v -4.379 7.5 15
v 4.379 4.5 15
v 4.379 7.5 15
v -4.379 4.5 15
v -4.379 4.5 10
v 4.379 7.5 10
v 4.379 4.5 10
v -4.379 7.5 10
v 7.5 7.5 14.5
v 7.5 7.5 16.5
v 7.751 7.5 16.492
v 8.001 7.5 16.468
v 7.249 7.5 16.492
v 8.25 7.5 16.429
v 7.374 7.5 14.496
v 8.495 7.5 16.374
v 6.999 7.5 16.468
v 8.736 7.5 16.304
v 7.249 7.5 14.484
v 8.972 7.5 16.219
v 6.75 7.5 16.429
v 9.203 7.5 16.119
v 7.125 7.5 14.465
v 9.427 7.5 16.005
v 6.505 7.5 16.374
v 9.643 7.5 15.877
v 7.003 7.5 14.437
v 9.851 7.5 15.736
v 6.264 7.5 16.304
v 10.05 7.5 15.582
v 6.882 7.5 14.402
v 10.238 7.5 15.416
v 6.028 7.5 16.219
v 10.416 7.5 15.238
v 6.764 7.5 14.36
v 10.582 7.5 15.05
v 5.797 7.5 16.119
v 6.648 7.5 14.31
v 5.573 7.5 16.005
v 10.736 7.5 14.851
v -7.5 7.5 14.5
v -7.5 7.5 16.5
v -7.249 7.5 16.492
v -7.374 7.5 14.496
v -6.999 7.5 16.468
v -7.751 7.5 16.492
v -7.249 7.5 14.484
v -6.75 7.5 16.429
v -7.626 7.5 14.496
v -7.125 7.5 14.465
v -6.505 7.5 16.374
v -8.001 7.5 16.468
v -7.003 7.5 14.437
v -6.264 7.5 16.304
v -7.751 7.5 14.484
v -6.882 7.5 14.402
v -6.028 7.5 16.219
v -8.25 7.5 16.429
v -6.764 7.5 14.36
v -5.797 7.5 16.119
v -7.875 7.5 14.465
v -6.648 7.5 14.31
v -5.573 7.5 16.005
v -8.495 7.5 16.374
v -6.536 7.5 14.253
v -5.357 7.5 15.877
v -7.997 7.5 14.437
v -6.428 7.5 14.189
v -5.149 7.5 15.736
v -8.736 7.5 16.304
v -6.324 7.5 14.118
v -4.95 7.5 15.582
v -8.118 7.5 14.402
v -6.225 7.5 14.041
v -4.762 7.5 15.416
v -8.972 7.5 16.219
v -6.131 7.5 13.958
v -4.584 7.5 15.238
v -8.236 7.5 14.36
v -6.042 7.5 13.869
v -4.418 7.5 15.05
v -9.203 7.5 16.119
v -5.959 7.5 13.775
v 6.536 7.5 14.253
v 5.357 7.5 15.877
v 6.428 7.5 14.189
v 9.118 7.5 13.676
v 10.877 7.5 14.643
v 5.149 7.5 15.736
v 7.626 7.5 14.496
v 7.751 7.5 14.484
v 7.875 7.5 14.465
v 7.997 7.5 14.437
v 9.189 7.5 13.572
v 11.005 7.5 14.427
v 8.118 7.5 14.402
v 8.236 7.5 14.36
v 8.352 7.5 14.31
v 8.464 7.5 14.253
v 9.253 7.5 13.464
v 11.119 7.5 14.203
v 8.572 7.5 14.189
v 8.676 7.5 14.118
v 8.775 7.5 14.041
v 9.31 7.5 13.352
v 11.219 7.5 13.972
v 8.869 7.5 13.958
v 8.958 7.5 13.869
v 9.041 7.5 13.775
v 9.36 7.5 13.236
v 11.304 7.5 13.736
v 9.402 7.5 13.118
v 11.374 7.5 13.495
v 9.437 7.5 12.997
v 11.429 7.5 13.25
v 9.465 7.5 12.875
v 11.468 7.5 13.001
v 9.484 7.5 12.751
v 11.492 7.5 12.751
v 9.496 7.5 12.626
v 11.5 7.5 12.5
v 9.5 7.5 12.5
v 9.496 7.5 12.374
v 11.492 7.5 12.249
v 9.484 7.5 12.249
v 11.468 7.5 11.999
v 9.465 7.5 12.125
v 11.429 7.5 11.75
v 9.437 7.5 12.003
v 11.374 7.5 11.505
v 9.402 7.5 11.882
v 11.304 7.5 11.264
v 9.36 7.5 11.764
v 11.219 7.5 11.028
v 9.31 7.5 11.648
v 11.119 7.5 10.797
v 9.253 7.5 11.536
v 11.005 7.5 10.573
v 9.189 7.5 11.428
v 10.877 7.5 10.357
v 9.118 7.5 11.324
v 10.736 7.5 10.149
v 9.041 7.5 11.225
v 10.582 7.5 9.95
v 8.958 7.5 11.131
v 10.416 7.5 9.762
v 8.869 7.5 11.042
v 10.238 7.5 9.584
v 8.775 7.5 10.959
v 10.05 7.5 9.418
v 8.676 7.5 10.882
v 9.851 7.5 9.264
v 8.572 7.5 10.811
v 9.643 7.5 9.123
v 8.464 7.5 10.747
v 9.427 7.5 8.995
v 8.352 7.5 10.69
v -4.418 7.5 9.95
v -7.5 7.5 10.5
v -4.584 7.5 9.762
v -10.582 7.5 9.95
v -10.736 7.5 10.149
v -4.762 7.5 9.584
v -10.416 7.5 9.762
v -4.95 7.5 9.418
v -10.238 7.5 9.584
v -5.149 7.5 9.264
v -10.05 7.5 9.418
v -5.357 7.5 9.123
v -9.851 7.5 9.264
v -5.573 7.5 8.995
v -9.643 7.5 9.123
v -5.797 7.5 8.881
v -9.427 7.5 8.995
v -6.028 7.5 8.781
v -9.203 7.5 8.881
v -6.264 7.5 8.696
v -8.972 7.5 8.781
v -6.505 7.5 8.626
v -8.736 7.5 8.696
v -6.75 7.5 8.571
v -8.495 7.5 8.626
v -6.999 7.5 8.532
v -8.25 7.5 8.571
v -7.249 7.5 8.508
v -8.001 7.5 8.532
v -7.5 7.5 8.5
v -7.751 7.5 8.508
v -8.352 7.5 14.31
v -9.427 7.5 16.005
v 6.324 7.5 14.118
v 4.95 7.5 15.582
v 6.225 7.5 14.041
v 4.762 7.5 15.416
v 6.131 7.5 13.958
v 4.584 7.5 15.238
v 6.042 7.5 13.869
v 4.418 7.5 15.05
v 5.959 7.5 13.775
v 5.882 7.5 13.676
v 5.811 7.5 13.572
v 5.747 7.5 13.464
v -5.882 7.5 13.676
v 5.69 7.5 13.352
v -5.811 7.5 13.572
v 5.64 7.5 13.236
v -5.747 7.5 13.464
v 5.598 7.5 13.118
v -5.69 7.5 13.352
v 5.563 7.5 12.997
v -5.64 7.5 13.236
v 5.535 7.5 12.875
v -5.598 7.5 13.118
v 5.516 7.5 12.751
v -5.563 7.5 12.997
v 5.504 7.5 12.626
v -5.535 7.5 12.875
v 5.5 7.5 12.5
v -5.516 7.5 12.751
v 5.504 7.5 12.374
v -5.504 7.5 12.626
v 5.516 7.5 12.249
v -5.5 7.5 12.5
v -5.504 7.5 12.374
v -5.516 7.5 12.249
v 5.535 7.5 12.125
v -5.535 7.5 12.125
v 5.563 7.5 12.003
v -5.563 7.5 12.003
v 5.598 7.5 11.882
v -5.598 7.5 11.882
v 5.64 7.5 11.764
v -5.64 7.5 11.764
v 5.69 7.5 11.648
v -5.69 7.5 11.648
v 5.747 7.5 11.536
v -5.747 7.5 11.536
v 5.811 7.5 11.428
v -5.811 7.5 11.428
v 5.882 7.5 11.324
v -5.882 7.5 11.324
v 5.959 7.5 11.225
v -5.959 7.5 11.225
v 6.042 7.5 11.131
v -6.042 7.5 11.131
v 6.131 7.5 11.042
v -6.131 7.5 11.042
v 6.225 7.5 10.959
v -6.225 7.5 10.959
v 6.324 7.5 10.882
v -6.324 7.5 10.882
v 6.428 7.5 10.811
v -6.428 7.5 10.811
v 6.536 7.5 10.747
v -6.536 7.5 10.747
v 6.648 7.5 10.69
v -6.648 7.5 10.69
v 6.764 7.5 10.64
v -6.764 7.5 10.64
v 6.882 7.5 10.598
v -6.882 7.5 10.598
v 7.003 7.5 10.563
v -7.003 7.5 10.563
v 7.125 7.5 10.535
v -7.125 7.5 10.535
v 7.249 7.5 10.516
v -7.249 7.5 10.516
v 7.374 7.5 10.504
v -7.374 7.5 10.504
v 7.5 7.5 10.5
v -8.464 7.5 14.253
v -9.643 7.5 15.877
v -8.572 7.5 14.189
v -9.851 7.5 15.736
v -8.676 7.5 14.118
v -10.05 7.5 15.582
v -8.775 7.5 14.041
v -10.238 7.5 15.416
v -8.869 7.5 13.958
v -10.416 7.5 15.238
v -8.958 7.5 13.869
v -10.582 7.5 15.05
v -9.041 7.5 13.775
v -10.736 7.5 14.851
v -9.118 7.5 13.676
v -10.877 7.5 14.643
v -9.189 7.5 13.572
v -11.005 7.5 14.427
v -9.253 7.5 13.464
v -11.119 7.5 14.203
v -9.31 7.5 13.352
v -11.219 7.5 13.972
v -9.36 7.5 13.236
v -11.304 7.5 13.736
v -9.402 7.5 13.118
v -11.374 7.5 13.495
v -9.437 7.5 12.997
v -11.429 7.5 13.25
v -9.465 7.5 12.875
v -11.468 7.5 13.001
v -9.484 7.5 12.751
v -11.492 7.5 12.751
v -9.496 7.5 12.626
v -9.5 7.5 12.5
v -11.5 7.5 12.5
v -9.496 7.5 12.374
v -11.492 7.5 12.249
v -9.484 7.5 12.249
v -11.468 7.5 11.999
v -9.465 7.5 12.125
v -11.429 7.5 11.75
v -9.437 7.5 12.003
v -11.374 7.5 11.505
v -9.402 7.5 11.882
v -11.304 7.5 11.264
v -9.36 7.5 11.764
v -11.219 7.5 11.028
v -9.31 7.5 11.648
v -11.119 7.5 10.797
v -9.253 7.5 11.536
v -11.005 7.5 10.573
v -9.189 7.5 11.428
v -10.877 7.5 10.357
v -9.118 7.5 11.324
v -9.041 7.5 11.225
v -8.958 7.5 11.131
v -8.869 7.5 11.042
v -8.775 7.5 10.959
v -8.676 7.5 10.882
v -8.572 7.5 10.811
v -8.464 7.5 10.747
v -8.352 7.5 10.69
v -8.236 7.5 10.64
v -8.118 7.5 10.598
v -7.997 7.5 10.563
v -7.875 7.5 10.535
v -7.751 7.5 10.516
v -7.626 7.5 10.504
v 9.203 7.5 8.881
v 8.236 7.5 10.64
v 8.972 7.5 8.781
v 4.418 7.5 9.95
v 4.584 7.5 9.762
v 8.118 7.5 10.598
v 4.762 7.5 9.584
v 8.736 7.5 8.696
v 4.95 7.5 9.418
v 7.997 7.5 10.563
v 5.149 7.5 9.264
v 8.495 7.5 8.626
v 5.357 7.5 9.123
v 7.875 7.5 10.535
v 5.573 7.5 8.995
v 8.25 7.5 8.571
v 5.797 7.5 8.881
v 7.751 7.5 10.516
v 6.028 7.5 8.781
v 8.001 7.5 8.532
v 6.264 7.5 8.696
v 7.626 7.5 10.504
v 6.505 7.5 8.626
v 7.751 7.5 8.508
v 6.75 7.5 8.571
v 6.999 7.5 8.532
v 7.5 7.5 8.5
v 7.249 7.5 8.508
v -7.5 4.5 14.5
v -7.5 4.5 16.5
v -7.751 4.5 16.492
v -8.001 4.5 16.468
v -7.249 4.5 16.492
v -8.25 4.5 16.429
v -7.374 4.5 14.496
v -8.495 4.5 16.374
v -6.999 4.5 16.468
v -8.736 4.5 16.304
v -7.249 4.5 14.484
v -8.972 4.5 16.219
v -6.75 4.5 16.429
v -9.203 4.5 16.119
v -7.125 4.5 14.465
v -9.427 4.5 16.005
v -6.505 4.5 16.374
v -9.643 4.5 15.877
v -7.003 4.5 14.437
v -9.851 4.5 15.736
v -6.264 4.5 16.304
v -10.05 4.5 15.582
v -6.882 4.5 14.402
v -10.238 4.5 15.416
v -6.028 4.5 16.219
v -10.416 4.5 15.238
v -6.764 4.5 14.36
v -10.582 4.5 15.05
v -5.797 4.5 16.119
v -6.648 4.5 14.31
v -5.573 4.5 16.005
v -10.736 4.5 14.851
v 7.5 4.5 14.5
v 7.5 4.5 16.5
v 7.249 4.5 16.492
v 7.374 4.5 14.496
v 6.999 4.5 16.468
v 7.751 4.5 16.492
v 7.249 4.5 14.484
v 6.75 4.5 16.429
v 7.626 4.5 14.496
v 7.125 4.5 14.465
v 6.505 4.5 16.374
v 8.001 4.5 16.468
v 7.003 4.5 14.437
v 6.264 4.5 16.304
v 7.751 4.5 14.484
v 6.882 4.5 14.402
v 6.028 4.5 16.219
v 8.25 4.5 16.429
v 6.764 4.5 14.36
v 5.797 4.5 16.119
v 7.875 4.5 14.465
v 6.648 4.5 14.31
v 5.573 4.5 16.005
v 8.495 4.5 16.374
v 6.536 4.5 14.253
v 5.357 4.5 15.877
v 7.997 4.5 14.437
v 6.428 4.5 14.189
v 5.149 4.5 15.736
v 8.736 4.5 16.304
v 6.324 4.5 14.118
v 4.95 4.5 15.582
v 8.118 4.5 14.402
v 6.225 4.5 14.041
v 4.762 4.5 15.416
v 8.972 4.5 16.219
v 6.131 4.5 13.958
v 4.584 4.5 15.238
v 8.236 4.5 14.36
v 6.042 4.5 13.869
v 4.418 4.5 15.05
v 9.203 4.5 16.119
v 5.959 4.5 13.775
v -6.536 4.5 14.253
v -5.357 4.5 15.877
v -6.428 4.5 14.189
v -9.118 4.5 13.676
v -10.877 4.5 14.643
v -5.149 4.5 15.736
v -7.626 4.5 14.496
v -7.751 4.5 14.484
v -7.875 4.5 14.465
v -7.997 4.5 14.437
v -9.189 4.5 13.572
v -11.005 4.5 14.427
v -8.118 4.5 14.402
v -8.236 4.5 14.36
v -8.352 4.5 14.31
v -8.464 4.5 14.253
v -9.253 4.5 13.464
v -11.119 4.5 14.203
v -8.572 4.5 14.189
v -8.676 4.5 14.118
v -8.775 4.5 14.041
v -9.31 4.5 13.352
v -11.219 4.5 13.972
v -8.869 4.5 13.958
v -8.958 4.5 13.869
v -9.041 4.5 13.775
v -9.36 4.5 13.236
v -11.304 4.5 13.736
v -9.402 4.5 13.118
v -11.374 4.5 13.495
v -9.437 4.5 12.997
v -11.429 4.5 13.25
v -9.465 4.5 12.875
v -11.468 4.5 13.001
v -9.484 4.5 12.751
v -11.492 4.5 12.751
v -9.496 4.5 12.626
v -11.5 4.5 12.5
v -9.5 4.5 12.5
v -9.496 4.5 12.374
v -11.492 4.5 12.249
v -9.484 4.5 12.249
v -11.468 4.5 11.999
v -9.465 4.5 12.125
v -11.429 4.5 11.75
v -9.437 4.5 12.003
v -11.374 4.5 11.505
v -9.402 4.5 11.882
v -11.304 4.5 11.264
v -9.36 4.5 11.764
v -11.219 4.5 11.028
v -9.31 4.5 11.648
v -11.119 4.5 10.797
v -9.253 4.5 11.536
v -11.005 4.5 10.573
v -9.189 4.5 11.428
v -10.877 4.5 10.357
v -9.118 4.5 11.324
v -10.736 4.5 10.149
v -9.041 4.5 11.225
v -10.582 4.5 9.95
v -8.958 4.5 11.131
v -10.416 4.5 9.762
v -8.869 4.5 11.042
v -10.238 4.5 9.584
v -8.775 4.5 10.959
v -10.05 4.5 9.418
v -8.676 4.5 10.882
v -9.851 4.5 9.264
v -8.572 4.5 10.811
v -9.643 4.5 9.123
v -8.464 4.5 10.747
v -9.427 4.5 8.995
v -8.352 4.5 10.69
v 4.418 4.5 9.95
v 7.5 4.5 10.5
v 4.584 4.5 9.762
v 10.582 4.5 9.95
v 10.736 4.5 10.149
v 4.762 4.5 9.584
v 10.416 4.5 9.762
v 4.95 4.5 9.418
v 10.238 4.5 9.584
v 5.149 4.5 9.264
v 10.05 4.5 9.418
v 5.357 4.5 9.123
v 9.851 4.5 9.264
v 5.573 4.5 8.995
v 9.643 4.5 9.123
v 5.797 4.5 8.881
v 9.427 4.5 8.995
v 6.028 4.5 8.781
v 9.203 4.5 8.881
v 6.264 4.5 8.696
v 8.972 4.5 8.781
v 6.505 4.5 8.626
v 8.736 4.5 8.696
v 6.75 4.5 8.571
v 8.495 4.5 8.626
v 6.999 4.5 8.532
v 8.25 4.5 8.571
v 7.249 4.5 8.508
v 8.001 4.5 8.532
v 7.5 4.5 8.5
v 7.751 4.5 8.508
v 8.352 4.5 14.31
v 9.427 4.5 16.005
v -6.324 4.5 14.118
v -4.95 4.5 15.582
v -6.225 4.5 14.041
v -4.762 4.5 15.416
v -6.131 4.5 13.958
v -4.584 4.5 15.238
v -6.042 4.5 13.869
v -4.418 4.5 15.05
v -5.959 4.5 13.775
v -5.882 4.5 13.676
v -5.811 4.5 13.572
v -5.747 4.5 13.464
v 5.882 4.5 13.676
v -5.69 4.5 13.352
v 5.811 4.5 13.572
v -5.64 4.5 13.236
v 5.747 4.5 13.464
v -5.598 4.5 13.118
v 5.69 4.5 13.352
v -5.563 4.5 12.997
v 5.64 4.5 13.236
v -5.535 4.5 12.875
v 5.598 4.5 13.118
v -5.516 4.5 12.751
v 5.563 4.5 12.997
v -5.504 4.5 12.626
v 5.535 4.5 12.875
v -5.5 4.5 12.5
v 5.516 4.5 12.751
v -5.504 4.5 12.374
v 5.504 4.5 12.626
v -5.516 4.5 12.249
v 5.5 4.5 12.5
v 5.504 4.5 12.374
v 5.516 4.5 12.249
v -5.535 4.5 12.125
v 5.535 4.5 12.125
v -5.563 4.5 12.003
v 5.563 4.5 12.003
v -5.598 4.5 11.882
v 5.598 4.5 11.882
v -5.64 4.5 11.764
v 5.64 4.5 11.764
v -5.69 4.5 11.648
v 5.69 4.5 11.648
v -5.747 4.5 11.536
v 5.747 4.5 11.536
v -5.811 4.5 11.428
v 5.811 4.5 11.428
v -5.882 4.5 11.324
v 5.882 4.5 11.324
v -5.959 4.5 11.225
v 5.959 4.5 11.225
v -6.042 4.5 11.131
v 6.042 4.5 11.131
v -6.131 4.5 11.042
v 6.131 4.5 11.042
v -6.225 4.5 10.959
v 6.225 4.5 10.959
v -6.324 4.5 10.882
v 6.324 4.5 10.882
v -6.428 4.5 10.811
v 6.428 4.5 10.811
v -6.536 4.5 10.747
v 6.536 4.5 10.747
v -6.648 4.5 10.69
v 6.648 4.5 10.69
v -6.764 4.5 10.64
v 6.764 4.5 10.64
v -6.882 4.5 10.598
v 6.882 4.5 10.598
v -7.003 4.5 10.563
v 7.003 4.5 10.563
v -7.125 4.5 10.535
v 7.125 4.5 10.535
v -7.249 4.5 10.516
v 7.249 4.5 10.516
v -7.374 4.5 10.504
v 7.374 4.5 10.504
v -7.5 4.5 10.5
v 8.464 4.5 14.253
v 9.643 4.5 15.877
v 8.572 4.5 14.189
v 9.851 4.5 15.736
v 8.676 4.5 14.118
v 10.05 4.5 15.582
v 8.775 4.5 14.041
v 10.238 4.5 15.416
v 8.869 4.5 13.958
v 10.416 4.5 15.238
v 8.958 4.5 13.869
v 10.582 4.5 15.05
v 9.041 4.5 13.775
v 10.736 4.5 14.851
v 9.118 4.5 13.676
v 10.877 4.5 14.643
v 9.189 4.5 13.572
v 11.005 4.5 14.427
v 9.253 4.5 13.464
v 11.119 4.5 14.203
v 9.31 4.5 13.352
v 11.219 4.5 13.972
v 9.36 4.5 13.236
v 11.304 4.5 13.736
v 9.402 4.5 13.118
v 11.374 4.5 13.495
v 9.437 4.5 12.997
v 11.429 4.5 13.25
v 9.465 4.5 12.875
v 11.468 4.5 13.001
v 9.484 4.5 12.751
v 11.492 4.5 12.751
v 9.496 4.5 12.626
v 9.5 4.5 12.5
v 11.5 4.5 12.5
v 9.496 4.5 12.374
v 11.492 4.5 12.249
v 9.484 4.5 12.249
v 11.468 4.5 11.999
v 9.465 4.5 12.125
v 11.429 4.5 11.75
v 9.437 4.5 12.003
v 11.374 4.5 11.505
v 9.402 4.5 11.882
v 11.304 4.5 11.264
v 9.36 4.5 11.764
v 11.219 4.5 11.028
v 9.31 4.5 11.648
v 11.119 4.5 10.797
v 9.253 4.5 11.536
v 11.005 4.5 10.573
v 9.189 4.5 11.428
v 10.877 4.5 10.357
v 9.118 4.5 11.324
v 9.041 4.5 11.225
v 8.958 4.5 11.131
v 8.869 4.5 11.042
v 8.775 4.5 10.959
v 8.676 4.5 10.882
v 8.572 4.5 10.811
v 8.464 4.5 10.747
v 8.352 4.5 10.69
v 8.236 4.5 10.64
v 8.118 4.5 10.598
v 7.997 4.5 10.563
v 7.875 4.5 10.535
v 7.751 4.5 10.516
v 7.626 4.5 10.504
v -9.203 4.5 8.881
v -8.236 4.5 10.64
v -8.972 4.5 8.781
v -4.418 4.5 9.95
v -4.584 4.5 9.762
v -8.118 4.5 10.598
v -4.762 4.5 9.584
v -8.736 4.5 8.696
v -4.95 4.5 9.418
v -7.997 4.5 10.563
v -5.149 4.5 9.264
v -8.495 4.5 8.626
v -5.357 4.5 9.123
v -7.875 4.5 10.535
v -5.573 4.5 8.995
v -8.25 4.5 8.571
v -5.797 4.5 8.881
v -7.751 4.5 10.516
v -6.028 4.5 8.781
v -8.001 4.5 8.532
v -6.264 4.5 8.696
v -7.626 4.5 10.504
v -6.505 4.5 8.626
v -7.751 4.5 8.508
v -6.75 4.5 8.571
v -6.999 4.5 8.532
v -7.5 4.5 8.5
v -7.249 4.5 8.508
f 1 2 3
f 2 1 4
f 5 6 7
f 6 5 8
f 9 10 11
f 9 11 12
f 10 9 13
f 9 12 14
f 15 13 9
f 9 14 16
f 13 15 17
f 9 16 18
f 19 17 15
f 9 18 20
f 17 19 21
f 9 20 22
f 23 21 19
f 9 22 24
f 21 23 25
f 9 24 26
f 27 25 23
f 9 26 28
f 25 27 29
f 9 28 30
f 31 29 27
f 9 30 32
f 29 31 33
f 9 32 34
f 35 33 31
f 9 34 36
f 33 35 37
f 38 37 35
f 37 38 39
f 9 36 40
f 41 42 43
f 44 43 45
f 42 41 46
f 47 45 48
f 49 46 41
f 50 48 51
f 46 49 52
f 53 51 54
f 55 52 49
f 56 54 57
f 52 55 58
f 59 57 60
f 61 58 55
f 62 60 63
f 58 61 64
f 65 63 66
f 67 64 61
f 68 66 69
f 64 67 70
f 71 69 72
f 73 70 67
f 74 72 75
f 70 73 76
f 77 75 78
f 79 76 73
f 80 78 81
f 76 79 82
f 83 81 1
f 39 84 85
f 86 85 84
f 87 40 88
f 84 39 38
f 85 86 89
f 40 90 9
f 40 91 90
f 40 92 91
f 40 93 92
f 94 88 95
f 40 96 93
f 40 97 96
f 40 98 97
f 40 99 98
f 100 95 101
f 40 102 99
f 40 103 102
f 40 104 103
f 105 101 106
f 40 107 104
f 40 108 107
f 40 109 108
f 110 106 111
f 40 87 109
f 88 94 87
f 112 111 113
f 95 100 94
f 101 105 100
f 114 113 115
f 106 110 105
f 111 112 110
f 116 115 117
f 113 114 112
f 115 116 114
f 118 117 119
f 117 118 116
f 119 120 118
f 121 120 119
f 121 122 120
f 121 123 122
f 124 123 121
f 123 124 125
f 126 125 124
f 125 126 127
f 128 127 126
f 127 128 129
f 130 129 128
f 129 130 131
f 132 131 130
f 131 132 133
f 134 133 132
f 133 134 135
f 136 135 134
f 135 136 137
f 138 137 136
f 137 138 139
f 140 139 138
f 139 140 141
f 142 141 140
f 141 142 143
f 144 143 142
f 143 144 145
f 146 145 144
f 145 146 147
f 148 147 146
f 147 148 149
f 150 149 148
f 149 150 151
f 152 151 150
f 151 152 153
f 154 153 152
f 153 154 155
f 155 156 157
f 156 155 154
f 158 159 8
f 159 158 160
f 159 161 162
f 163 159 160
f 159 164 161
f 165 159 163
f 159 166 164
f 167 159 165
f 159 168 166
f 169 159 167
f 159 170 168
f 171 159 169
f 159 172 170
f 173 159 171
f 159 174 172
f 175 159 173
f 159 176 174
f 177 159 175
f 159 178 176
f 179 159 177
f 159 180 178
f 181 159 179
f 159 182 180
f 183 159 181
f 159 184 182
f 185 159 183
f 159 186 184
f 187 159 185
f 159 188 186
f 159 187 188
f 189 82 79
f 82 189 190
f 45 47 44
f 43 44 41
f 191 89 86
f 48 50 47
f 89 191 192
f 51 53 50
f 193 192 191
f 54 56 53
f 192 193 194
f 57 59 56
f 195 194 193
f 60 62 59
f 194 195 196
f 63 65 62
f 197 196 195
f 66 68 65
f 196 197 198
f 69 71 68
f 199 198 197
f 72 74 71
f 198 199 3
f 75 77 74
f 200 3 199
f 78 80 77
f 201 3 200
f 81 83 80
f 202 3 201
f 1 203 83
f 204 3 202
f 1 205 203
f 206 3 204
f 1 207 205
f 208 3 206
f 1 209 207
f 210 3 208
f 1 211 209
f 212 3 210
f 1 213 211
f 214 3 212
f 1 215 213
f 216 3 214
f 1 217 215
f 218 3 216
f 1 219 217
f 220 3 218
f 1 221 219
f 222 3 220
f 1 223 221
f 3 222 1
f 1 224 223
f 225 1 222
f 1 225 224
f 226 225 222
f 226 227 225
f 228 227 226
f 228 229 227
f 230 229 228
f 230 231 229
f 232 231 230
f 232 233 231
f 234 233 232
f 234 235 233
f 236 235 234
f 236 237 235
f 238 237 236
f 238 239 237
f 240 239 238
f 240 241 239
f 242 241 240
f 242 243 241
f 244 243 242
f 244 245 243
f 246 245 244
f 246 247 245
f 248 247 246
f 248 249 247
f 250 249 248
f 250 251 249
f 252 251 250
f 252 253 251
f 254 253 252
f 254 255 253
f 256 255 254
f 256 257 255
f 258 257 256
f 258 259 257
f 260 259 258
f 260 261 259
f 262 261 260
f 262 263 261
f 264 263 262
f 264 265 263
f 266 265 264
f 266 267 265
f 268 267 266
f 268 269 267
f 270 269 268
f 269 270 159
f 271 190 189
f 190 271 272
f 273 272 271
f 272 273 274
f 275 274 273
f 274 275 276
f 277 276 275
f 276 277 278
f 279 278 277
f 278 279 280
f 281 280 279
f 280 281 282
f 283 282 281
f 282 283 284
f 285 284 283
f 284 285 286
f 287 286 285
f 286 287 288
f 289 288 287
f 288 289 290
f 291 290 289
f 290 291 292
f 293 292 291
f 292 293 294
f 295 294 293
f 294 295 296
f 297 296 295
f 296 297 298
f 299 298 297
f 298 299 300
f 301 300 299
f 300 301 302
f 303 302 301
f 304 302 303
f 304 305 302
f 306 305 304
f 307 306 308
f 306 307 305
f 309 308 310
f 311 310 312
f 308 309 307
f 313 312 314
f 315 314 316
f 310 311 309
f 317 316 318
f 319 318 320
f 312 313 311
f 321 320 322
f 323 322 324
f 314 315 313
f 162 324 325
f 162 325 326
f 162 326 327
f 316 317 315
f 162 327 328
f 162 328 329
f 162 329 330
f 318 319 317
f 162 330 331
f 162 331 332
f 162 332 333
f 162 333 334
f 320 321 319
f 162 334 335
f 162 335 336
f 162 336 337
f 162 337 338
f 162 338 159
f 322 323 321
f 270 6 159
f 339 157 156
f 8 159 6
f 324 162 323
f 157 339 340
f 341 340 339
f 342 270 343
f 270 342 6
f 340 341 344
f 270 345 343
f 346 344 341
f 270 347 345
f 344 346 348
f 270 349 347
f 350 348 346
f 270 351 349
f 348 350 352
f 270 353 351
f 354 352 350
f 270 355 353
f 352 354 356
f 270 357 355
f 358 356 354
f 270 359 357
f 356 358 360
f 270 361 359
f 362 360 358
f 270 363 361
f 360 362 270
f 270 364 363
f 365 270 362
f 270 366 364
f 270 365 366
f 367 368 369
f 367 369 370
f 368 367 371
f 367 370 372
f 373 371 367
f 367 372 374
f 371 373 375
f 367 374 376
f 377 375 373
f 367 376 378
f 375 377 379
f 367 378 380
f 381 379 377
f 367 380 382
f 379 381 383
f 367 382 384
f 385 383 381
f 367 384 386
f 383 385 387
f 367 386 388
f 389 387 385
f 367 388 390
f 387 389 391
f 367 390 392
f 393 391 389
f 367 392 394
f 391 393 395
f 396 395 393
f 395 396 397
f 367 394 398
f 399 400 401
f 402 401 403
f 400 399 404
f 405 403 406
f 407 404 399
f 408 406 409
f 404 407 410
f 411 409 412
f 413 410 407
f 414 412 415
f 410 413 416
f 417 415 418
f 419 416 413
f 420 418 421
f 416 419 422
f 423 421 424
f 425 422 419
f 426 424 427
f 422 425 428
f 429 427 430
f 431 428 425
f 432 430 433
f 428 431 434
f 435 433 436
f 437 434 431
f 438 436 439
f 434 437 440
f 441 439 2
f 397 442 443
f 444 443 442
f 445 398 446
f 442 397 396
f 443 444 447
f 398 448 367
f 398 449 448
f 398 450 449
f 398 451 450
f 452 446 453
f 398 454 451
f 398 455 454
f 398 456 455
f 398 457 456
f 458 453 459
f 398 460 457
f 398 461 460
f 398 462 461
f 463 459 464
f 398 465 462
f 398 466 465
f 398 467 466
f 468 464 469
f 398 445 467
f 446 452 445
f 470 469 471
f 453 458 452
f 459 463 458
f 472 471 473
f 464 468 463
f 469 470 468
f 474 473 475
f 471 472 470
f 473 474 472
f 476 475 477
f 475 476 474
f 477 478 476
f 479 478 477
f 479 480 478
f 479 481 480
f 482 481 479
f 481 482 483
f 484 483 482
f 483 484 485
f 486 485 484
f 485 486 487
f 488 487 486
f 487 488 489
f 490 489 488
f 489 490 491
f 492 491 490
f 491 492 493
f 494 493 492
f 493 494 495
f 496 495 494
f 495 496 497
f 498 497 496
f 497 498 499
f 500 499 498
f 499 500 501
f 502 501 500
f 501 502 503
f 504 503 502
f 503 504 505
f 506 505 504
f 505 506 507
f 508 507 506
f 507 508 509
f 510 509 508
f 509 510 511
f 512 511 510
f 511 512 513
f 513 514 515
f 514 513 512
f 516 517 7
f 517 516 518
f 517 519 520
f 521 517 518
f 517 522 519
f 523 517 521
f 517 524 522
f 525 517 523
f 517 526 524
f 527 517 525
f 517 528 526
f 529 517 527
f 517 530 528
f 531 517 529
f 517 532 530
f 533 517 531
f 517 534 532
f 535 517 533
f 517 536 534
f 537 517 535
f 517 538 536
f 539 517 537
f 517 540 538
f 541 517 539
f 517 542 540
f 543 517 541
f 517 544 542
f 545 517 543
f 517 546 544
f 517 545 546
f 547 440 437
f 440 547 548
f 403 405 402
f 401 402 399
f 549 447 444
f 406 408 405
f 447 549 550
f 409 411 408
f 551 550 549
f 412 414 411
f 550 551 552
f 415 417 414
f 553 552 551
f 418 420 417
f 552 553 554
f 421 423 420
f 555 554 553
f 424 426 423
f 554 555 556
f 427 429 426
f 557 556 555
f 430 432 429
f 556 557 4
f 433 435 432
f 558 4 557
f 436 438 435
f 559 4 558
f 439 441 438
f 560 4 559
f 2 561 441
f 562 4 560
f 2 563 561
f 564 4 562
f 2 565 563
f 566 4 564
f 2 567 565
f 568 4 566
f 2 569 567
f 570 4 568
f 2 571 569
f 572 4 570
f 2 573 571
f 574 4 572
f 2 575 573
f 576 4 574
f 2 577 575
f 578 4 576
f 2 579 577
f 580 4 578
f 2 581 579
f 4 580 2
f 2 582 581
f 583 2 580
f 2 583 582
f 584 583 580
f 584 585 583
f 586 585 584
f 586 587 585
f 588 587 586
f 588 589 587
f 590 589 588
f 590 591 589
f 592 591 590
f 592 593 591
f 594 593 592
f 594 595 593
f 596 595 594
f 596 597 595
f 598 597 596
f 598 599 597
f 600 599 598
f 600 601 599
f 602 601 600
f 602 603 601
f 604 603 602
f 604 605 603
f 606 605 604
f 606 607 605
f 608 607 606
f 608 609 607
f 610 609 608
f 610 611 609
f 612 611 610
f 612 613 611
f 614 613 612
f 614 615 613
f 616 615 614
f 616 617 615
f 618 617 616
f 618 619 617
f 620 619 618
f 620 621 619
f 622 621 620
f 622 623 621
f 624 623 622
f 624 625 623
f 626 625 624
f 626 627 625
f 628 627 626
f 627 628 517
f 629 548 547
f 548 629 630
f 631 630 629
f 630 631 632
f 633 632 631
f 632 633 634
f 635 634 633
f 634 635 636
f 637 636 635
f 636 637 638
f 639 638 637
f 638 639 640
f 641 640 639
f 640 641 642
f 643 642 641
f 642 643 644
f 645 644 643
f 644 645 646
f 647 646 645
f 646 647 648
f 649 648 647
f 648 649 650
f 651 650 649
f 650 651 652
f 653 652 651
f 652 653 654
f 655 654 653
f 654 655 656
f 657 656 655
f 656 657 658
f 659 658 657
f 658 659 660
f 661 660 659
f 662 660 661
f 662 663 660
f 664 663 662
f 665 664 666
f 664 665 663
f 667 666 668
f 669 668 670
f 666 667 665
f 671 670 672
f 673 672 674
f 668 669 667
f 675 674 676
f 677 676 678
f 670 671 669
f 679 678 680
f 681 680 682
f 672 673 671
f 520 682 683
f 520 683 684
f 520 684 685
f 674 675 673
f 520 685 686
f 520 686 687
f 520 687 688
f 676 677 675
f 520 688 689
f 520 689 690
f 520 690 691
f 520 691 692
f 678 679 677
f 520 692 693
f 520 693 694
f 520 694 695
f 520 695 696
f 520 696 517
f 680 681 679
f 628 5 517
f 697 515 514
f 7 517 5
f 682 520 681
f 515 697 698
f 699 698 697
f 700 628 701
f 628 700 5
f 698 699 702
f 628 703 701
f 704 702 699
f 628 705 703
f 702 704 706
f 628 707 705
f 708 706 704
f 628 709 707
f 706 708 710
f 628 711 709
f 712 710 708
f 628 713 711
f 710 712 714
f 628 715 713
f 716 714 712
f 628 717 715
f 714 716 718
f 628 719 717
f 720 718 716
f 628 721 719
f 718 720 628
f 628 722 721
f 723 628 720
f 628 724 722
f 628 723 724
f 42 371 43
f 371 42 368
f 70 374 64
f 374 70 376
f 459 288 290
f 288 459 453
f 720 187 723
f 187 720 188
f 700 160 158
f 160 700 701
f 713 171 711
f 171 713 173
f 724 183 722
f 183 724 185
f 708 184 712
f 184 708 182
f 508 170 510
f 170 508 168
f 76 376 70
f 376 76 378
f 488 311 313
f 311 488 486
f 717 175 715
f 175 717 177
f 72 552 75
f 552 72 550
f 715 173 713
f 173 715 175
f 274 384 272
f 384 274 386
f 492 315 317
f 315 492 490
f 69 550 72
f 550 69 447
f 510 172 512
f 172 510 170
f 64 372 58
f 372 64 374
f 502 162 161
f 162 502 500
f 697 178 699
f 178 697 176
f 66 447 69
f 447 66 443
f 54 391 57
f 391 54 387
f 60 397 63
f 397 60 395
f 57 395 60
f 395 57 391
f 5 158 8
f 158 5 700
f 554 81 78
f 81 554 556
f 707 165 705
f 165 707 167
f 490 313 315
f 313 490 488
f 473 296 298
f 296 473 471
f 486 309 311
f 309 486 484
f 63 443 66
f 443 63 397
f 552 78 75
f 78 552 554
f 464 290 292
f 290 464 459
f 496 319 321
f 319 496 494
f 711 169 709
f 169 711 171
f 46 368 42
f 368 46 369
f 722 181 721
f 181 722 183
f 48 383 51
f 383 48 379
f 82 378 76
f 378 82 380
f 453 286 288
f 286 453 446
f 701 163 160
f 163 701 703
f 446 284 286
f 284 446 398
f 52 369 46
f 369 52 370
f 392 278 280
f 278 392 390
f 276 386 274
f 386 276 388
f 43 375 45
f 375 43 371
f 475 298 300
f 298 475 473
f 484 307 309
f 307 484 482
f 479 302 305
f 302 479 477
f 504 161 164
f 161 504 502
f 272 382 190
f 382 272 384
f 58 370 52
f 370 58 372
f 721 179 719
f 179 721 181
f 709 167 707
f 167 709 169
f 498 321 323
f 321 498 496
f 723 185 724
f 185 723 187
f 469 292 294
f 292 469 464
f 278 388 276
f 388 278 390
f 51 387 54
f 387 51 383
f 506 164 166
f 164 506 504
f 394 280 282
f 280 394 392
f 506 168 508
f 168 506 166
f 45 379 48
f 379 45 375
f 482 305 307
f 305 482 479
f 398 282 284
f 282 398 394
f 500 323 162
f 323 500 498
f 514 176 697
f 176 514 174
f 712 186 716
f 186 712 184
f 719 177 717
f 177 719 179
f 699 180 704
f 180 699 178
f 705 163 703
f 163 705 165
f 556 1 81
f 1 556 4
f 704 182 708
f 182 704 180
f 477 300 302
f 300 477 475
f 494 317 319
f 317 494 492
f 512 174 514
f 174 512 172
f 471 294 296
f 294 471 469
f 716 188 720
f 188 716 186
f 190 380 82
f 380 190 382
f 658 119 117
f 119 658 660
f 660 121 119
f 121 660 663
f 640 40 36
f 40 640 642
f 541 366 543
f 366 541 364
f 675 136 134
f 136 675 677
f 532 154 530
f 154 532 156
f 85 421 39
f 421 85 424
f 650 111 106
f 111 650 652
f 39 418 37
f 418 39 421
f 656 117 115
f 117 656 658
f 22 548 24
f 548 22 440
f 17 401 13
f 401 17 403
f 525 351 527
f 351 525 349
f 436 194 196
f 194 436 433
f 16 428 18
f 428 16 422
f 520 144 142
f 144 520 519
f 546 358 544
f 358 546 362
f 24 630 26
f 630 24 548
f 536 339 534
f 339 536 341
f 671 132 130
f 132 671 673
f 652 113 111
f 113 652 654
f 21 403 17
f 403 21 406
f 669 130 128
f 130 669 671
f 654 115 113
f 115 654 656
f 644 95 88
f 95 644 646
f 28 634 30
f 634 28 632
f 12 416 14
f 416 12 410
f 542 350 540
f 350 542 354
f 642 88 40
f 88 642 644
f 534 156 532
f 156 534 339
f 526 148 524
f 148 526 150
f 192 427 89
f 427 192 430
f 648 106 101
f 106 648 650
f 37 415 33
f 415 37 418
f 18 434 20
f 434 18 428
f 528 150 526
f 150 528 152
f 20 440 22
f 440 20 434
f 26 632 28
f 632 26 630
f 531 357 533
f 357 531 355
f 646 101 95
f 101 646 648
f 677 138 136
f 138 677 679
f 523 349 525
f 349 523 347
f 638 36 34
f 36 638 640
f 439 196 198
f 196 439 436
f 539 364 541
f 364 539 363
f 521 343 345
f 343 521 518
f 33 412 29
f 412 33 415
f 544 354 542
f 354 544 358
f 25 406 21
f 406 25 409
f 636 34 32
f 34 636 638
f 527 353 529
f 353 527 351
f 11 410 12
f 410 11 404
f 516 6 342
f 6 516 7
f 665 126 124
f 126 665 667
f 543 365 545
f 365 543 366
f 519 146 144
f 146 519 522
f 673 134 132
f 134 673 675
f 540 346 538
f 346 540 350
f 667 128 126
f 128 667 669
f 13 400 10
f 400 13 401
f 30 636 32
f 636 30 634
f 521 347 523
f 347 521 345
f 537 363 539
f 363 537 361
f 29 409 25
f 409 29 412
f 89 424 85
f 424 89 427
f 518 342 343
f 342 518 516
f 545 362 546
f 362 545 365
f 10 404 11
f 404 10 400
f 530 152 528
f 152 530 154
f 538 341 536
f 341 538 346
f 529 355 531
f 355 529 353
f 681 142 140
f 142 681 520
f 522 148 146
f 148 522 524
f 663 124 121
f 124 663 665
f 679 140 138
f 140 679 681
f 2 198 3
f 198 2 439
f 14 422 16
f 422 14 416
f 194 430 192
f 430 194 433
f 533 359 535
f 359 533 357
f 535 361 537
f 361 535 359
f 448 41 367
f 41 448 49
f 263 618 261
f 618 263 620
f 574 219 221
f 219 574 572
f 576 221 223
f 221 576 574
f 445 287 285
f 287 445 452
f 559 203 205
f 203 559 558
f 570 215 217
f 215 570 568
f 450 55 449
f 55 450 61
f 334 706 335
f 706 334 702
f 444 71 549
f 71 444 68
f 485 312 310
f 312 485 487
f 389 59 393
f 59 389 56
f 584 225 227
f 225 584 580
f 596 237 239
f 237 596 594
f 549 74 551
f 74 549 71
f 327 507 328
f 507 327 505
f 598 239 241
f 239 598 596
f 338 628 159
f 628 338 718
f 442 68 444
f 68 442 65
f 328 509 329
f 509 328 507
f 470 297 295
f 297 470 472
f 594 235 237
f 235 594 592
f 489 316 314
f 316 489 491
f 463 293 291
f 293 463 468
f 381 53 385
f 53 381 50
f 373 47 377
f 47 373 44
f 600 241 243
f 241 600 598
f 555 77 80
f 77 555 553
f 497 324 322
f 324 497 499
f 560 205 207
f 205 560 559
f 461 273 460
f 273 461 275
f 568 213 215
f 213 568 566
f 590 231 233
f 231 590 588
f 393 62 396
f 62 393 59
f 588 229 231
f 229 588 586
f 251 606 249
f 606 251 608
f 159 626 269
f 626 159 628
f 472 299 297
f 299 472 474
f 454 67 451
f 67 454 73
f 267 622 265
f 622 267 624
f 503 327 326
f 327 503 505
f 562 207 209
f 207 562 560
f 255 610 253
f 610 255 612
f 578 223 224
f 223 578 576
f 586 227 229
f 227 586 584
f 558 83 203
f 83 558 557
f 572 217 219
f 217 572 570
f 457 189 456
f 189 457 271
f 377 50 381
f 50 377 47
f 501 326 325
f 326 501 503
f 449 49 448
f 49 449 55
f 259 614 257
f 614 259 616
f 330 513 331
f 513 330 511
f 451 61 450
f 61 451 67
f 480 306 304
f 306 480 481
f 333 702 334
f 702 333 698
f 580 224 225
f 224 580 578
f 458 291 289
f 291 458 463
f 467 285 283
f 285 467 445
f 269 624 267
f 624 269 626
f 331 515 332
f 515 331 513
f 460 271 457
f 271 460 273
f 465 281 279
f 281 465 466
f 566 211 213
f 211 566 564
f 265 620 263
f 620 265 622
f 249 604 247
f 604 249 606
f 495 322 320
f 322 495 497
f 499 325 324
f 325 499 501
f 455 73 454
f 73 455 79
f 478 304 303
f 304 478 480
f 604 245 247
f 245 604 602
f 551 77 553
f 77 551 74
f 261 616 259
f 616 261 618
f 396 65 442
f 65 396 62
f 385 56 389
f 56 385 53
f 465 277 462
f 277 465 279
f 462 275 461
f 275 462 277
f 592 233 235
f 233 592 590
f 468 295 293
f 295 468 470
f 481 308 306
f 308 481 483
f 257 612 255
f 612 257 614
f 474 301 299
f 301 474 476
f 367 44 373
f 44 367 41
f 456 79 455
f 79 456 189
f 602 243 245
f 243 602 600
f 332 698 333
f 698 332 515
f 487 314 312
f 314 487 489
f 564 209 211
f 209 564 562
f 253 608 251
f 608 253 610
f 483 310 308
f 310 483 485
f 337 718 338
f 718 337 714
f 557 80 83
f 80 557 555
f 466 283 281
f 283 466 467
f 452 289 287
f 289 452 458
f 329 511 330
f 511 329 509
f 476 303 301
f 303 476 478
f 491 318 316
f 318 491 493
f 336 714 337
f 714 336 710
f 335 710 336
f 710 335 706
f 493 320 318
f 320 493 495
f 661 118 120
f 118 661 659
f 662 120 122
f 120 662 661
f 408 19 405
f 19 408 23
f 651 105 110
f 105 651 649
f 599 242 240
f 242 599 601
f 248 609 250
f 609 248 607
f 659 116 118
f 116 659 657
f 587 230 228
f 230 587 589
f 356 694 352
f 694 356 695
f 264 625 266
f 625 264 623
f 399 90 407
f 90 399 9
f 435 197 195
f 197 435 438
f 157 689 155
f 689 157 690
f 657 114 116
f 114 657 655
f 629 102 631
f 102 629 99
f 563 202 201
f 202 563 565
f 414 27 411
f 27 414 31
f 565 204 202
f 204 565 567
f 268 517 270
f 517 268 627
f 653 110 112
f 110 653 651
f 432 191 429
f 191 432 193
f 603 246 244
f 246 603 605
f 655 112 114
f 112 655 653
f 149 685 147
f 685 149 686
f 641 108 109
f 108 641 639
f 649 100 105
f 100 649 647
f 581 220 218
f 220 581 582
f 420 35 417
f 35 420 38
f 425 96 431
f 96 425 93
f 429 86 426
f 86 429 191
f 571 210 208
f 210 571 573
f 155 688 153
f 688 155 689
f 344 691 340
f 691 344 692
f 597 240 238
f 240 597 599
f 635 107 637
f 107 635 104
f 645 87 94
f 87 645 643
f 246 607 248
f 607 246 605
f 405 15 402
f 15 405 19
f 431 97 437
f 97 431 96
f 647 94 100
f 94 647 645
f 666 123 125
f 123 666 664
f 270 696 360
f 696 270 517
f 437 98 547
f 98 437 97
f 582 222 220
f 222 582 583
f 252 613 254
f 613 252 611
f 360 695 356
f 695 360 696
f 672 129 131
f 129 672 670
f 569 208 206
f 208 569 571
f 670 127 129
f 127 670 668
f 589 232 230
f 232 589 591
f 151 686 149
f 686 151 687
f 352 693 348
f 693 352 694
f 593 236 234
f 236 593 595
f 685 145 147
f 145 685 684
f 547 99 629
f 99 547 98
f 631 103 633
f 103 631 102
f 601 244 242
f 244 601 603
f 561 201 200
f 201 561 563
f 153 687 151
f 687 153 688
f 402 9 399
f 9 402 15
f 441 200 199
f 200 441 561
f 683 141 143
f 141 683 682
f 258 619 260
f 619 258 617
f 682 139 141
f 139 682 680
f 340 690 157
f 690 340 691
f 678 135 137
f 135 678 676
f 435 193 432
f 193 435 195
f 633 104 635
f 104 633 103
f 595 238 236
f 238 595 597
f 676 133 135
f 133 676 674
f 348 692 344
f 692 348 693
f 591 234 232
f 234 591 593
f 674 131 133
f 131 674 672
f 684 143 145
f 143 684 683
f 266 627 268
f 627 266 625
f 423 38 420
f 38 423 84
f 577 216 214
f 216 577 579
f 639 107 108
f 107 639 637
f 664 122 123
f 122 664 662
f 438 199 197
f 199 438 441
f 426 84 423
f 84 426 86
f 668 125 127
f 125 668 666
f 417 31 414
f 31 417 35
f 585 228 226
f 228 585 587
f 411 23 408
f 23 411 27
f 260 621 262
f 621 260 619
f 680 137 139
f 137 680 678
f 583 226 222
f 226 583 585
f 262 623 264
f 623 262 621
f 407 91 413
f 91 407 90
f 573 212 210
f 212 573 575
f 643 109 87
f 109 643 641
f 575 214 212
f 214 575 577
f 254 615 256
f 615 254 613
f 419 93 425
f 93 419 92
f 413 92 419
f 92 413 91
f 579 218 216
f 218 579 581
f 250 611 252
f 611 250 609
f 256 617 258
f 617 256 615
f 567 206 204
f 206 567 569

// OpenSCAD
difference(){
	union(){
        
        translate([-8,4.5,10]){
            cube([15,3,5], center=false);
        }         
        translate([-7.5,7.5,12.5]){
            rotate([90,0,0]){
                cylinder(h=3, r=4, $fn=100, center=false);
            }
        }         
        translate([7.5,7.5,12.5]){
            rotate([90,0,0]){
                cylinder(h=3, r=4, $fn=100, center=false);
            }
        }         


	}
	union() {

        translate([-7.5,8.5,12.5]){
            rotate([90,0,0]){
                cylinder(h=25, r=2, $fn=100, center=false);
            }
        }         
        translate([7.5,8.5,12.5]){
            rotate([90,0,0]){
                cylinder(h=25, r=2, $fn=100, center=false);
            }
        }             


	}
}
